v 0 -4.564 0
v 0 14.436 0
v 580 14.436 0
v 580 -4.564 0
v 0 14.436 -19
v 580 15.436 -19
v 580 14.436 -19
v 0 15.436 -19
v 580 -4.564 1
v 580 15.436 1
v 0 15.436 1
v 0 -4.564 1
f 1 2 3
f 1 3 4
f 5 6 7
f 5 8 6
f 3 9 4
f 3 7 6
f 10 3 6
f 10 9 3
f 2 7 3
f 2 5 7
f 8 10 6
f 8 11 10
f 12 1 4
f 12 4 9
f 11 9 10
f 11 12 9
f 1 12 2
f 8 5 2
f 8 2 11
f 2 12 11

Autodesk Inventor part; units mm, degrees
ref_plane "YZ Plane" through (0, 0, 0) normal (1, 0, 0) x (0, 1, 0)
ref_plane "XZ Plane" through (0, 0, 0) normal (0, 1, 0) x (-1, 0, 0)
ref_plane "XY Plane" through (0, 0, 0) normal (0, 0, 1) x (1, 0, 0)
sketch "Эскиз1" plane through (0, 0, 0) normal (1, 0, 0) x (0, 1, 0)
  line L0 (-4.5638, 0) -> (-4.5638, 1)
  line L1 (-4.5638, 1) -> (15.4362, 1)
  line L2 (15.4362, 1) -> (15.4362, -19)
  line L3 (15.4362, -19) -> (14.4362, -19)
  line L4 (14.4362, -19) -> (14.4362, 0)
  line L5 (14.4362, 0) -> (-4.5638, 0)
  point P0 (0, 0)
  dimension "d0" = 1
  dimension "d1" = 20
  dimension "d2" = 20
  dimension "d3" = 1
  dimension "d4" = 19
extrude "Выдавливание1" add sketch "Эскиз1" along normal blind 580
properties part number "уголок 580" material "Алюминий 6061"
